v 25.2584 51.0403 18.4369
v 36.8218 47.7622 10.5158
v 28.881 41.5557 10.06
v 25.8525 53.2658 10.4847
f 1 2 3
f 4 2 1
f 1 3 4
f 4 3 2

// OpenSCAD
// Auto-generated auxetic polyhedron
points = [
    [28.881005, 41.555687, 10.060030],
    [36.821802, 47.762249, 10.515791],
    [25.258368, 51.040297, 18.436867],
    [25.852521, 53.265772, 10.484694],
];

faces = [
    [0, 1, 2],
    [2, 1, 3],
    [3, 0, 2],
    [1, 0, 3],
];

polyhedron(points = points, faces = faces);
